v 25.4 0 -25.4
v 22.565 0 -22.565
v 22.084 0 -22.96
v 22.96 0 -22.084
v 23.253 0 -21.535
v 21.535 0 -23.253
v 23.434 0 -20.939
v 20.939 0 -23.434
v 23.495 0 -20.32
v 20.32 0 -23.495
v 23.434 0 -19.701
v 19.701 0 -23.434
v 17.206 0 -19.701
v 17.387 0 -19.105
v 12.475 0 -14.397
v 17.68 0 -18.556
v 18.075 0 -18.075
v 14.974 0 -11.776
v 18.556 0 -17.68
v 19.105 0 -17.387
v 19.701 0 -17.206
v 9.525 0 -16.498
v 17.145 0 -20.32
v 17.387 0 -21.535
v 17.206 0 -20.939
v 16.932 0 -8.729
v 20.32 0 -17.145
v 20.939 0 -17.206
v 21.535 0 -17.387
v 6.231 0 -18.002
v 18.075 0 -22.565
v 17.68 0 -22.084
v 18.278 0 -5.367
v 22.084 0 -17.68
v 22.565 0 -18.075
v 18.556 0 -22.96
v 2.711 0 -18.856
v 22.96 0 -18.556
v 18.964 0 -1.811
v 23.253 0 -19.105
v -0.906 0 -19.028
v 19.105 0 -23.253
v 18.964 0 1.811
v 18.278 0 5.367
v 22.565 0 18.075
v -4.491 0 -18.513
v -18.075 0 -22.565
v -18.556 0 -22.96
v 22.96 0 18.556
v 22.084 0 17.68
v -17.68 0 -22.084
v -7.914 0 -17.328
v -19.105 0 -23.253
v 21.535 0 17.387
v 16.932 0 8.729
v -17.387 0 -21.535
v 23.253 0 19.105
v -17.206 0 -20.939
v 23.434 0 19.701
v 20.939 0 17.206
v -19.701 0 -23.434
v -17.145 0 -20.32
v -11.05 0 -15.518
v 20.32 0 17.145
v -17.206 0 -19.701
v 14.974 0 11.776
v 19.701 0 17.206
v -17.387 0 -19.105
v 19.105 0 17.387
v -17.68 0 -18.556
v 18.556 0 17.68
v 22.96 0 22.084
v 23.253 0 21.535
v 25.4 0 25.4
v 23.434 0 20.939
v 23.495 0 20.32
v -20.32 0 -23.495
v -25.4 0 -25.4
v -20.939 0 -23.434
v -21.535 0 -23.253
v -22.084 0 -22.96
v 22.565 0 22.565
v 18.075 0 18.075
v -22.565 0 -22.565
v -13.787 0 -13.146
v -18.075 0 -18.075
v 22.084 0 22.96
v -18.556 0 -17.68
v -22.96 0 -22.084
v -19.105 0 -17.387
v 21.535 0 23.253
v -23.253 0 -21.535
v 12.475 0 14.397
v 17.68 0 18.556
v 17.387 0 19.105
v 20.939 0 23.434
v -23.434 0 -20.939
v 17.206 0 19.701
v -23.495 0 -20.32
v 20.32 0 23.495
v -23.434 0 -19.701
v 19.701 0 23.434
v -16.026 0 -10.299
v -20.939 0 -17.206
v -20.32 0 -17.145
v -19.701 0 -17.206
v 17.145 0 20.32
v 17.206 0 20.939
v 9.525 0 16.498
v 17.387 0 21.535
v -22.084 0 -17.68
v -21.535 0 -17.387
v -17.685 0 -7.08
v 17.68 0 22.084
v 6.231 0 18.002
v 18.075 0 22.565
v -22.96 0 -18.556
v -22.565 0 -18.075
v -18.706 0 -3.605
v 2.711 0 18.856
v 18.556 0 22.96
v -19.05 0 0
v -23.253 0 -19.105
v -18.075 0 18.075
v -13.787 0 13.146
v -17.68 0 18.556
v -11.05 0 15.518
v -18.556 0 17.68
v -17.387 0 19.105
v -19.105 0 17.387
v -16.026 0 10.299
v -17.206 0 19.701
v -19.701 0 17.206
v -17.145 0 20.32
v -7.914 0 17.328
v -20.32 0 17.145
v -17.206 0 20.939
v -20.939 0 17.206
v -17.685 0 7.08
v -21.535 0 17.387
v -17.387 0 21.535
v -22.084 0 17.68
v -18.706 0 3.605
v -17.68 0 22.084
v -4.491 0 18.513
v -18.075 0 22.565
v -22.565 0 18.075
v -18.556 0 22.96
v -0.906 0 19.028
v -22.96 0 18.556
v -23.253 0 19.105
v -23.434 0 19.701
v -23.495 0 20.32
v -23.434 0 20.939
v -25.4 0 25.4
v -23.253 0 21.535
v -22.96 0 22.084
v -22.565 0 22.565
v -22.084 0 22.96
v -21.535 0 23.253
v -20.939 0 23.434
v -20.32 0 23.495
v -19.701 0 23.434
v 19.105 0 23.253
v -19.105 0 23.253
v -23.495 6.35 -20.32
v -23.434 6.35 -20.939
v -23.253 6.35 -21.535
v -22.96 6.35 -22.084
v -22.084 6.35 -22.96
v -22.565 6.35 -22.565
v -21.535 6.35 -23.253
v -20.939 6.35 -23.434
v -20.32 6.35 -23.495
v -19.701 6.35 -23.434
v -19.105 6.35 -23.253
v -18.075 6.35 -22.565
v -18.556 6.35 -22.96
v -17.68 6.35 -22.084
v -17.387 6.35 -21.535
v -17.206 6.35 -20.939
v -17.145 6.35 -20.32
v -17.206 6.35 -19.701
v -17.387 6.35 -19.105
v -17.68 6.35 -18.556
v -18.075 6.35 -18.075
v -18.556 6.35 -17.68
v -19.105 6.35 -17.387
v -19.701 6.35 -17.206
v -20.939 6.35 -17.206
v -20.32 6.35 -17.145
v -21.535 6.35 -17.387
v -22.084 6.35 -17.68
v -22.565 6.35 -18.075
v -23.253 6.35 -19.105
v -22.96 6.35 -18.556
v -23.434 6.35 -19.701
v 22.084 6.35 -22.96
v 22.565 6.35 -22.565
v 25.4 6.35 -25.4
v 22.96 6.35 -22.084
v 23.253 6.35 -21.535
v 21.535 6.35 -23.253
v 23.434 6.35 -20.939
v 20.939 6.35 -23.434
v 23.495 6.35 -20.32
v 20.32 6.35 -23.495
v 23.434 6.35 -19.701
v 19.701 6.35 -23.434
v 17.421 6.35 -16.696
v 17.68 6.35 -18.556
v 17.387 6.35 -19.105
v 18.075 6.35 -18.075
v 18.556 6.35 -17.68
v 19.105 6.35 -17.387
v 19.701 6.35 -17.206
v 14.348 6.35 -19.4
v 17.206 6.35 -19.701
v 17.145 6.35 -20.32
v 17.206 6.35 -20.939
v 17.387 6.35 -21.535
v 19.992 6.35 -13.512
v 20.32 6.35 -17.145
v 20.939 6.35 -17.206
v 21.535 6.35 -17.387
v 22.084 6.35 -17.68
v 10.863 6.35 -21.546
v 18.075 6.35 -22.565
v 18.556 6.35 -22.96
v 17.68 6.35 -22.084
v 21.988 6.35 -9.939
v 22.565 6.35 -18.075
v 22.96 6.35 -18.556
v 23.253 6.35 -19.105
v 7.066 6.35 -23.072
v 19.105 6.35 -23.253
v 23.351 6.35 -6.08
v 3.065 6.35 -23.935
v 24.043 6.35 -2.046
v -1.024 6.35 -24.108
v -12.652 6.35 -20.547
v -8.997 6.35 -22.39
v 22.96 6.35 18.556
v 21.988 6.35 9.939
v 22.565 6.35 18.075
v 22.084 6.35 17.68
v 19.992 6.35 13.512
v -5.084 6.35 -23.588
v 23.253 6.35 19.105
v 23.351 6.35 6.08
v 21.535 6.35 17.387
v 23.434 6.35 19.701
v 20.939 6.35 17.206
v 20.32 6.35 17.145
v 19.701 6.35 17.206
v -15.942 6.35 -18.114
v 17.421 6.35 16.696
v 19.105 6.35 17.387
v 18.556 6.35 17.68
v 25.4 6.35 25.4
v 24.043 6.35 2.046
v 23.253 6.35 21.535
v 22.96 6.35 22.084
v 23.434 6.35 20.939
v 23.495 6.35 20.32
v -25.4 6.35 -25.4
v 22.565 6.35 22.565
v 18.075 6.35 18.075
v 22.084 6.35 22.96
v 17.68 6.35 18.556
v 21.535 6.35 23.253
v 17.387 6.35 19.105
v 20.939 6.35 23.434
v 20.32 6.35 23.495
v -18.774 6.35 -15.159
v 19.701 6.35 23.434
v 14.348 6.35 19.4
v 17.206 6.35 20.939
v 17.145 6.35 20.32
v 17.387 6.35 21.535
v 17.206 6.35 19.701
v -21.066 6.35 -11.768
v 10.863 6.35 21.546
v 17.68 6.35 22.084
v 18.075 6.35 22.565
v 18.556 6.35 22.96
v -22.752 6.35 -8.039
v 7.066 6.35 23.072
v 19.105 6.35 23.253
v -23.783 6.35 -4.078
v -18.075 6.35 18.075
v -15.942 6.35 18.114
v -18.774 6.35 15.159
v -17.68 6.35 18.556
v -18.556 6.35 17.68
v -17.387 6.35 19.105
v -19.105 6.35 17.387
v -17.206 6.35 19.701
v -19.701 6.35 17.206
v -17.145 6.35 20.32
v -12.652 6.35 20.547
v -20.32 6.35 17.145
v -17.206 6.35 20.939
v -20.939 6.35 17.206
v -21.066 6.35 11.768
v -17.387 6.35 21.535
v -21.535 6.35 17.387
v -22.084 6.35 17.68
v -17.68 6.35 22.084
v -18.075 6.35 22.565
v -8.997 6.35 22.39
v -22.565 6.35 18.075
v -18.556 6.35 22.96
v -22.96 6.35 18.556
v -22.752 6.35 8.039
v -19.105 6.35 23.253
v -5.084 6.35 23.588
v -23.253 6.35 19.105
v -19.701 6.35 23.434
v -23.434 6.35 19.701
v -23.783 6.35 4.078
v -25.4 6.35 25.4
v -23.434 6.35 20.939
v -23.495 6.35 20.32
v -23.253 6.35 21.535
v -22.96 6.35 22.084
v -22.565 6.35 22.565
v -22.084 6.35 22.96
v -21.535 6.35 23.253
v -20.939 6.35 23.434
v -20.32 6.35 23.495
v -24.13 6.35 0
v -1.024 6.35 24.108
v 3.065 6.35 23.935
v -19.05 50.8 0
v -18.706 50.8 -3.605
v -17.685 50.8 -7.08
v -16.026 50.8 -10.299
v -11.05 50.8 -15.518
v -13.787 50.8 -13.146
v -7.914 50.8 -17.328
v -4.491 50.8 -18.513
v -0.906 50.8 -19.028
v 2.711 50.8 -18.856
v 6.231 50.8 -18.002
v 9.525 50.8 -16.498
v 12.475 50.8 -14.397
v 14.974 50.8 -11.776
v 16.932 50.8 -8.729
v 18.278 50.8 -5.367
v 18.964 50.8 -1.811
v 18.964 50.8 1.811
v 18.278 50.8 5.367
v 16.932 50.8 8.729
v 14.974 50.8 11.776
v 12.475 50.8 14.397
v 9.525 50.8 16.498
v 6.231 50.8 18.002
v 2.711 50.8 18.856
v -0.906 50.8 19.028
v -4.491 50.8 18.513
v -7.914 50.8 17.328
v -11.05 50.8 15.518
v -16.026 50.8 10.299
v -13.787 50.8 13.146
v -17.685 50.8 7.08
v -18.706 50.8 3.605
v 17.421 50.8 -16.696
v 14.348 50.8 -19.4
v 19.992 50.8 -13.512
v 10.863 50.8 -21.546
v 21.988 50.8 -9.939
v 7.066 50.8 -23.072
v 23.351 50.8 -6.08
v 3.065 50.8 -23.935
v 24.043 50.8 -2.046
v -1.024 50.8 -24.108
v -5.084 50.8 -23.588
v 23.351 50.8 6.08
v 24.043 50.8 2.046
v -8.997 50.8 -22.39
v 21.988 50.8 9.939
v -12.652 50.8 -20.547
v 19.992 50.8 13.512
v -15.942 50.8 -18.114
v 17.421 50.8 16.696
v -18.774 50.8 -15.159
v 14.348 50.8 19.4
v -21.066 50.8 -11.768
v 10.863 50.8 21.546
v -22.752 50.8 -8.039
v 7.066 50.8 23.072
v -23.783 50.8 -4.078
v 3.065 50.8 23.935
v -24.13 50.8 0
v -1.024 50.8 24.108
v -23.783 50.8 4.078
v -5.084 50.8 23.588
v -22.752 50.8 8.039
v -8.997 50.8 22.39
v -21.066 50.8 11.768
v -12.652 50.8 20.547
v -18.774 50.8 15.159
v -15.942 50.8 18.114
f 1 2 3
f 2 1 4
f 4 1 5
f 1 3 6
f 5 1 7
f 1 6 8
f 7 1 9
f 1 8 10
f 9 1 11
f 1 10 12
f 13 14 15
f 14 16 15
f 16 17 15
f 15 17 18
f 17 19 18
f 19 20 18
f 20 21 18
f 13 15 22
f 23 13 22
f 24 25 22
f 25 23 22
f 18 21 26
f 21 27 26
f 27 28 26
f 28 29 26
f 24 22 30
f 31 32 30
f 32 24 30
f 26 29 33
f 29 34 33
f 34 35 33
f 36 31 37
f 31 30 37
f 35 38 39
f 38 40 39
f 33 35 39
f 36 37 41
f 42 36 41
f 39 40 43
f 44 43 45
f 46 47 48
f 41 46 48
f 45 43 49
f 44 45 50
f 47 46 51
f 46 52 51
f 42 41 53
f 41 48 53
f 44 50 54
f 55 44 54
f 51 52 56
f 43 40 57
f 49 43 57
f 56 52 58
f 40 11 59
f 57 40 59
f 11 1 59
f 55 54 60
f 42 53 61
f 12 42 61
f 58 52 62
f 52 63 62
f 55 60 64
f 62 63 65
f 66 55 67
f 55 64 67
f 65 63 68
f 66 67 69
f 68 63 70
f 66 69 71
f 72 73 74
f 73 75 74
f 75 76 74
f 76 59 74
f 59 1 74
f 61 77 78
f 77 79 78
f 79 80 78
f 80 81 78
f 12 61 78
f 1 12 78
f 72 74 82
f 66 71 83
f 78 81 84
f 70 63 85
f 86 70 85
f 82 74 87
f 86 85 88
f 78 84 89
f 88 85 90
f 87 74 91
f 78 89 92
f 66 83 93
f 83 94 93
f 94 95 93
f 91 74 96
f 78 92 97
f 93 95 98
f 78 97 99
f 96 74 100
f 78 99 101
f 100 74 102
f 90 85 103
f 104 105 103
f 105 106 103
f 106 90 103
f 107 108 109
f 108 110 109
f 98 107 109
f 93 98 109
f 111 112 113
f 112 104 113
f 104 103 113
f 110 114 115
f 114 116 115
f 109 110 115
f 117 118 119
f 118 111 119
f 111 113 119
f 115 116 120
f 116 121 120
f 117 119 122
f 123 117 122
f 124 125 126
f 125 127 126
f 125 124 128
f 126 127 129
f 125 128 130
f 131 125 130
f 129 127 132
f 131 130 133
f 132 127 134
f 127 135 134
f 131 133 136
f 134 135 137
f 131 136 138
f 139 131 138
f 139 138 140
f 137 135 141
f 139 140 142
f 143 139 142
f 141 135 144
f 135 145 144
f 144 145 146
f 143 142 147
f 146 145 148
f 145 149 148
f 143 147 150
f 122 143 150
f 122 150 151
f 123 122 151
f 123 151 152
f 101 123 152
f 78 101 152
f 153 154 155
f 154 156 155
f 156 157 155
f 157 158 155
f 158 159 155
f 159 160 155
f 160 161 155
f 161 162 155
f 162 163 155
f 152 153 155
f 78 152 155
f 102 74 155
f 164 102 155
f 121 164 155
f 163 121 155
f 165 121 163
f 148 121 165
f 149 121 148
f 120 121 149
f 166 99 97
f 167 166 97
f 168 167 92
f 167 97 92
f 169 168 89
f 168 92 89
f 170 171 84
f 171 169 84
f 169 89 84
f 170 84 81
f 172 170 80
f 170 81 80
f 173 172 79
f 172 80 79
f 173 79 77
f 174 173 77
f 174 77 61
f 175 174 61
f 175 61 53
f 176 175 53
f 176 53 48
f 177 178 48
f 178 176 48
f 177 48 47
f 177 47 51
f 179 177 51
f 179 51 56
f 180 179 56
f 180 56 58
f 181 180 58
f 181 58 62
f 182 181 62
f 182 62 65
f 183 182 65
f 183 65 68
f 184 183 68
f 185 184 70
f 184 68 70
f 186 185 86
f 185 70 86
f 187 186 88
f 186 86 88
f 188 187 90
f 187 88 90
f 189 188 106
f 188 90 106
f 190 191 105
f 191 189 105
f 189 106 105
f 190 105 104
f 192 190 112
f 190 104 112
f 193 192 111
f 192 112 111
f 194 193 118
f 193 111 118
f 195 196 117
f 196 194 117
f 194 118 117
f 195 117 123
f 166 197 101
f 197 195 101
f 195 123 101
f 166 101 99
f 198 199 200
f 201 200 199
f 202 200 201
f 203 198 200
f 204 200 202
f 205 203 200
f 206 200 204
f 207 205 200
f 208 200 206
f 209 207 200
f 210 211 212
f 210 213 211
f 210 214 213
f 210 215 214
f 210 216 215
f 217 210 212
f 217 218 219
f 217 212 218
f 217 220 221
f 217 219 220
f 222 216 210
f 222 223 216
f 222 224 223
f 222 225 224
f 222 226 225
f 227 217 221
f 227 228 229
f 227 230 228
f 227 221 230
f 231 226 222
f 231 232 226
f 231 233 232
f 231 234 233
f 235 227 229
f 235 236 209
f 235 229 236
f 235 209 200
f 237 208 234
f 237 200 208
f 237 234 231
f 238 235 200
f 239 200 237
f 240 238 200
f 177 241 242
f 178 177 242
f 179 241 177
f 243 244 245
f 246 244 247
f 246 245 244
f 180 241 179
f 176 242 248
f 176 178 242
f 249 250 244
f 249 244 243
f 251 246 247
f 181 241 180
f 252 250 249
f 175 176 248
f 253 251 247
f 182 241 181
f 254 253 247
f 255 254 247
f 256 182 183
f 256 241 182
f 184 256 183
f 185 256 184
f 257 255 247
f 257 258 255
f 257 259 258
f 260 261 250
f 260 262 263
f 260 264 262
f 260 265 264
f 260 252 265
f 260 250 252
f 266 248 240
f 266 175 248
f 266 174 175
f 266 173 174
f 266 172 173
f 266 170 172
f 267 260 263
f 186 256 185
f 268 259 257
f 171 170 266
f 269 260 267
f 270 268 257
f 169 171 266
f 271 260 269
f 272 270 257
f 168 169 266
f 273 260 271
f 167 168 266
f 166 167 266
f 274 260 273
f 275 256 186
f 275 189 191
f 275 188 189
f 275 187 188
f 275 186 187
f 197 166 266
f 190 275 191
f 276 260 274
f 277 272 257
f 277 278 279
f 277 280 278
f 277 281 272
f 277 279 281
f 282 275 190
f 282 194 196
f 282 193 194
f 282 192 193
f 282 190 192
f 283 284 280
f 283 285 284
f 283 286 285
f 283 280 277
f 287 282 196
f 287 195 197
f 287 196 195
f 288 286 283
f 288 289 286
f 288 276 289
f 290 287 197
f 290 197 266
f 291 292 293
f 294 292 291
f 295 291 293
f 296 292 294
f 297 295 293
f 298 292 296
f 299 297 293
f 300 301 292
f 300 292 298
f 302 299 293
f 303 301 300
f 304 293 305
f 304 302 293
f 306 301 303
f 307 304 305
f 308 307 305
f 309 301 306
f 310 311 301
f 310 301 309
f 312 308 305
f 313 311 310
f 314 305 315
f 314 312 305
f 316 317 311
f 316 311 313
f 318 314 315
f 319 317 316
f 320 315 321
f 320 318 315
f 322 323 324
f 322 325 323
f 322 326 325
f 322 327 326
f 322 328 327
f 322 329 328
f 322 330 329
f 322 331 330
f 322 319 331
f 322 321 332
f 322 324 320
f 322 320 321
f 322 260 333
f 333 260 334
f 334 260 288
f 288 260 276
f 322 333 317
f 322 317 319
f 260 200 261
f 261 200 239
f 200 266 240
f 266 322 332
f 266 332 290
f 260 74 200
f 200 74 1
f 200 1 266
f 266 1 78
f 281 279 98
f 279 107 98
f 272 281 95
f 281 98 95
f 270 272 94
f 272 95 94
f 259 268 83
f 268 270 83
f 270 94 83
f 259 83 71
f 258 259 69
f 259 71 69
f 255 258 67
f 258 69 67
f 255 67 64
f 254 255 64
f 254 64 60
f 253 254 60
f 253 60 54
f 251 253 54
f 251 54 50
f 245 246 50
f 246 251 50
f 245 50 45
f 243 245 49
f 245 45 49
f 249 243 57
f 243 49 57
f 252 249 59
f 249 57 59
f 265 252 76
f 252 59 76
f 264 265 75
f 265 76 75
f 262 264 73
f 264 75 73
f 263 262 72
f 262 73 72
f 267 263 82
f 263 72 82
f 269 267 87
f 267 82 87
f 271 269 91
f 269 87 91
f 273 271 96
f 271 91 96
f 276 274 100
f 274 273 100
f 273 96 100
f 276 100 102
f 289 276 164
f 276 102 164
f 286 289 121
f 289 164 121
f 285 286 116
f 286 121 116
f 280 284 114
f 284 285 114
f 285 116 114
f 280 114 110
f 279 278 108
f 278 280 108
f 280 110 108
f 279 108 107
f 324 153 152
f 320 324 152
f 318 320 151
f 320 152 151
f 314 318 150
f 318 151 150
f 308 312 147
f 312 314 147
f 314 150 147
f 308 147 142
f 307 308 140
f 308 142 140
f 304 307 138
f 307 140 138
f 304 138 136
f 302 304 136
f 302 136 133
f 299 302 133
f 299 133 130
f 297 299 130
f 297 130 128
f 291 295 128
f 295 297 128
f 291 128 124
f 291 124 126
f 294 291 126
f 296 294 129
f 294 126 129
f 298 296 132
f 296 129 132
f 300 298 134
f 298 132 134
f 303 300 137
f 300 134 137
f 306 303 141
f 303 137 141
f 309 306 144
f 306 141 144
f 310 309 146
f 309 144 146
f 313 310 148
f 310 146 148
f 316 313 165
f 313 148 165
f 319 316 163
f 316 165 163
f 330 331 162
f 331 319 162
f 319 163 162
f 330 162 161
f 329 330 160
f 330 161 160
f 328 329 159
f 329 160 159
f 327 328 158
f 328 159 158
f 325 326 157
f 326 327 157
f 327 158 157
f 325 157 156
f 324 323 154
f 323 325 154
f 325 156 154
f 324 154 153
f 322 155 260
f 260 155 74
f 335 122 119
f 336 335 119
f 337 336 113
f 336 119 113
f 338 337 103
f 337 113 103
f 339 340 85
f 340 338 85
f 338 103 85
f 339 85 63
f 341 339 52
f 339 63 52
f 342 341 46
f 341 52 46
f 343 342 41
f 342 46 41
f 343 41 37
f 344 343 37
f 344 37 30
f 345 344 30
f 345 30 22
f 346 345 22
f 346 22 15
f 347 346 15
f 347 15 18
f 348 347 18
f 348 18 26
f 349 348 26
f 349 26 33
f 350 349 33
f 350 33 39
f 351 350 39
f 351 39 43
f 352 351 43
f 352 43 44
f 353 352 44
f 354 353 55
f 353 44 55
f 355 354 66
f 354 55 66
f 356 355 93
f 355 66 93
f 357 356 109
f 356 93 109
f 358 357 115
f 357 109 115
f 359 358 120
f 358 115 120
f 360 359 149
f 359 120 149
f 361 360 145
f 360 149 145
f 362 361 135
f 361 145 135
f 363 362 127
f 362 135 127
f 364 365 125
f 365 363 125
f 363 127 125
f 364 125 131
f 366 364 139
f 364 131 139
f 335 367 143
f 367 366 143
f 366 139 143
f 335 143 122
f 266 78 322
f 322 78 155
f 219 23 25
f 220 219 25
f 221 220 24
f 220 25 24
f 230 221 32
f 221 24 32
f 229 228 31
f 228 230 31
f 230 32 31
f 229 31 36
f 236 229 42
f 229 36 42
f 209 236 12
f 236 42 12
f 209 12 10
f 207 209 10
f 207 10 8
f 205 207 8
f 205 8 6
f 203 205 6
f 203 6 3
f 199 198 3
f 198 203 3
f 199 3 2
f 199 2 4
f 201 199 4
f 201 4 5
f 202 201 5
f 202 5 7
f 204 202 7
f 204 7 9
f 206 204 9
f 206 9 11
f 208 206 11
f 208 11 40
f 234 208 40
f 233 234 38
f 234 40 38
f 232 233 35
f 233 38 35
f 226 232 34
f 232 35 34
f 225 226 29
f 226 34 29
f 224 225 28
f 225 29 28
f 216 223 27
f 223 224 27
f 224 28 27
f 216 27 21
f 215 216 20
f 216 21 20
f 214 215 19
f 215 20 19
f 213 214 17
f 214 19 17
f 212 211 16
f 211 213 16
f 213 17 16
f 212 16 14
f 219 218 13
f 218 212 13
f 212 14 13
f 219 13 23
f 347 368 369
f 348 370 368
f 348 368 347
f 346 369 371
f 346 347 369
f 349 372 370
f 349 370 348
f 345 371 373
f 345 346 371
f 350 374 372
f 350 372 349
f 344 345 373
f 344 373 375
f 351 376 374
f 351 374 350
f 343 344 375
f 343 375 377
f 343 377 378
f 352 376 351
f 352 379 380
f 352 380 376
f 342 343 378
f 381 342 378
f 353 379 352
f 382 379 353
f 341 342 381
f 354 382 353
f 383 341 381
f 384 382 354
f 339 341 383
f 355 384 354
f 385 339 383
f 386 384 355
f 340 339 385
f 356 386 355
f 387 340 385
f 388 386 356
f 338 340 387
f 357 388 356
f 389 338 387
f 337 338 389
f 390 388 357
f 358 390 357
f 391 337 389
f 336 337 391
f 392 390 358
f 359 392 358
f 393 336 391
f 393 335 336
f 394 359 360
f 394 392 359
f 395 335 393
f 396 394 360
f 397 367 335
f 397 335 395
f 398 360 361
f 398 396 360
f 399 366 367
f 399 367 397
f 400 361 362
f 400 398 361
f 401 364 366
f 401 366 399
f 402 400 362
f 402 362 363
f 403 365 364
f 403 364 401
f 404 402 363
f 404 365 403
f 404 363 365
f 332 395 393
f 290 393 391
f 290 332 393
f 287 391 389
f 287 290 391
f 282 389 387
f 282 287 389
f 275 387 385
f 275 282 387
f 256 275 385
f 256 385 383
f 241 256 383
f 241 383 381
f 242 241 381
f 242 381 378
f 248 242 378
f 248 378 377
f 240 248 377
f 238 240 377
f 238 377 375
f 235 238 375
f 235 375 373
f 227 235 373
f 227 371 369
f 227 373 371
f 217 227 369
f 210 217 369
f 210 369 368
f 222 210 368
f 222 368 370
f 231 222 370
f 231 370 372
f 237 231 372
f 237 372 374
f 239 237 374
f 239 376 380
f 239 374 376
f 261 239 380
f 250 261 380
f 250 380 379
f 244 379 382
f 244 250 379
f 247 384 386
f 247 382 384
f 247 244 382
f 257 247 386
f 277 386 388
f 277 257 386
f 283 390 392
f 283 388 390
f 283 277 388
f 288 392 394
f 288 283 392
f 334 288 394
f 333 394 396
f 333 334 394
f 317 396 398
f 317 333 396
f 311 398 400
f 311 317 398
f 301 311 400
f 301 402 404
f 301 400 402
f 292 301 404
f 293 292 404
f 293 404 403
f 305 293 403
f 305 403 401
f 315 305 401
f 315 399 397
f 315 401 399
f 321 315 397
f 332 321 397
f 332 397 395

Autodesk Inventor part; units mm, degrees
ref_plane "YZ Plane" through (0, 0, 0) normal (1, 0, 0) x (0, 1, 0)
ref_plane "XZ Plane" through (0, 0, 0) normal (0, 1, 0) x (-1, 0, 0)
ref_plane "XY Plane" through (0, 0, 0) normal (0, 0, 1) x (1, 0, 0)
sketch "Sketch1" plane through (0, 0, 0) normal (0, 1, 0) x (-1, 0, 0)
  circle A0 centre (0, 0) radius 19.05
  circle A1 centre (0, 0) radius 24.13
  line L0 (25.4, 25.4) -> (-25.4, 25.4)
  line L1 (-25.4, 25.4) -> (-25.4, -25.4)
  line L2 (-25.4, -25.4) -> (25.4, -25.4)
  line L3 (25.4, -25.4) -> (25.4, 25.4)
  line L4 (-25.4, -25.4) -> (-12.1092, -25.4) construction
  circle A2 centre (-20.32, -20.32) radius 3.175
  circle A3 centre (-20.32, 20.32) radius 3.175
  circle A4 centre (20.32, -20.32) radius 3.175
  circle A5 centre (20.32, 20.32) radius 3.175
  dimension "d10" = 50.8
  dimension "d11" = 50.8
  dimension "d20" = 6.35
extrude "Extrusion1" add sketch "Sketch1" along normal blind 50.8 contours A1
extrude "Extrusion3" add sketch "Sketch1" along normal blind 6.35 contours A1 | L3 L2 L1 L0 | A2 | A3 | A4 | A5
extrude "Extrusion5" cut sketch "Sketch1" along normal blind 6.35 contours A2 | A3 | A4 | A5
properties part number "Cylinders"
